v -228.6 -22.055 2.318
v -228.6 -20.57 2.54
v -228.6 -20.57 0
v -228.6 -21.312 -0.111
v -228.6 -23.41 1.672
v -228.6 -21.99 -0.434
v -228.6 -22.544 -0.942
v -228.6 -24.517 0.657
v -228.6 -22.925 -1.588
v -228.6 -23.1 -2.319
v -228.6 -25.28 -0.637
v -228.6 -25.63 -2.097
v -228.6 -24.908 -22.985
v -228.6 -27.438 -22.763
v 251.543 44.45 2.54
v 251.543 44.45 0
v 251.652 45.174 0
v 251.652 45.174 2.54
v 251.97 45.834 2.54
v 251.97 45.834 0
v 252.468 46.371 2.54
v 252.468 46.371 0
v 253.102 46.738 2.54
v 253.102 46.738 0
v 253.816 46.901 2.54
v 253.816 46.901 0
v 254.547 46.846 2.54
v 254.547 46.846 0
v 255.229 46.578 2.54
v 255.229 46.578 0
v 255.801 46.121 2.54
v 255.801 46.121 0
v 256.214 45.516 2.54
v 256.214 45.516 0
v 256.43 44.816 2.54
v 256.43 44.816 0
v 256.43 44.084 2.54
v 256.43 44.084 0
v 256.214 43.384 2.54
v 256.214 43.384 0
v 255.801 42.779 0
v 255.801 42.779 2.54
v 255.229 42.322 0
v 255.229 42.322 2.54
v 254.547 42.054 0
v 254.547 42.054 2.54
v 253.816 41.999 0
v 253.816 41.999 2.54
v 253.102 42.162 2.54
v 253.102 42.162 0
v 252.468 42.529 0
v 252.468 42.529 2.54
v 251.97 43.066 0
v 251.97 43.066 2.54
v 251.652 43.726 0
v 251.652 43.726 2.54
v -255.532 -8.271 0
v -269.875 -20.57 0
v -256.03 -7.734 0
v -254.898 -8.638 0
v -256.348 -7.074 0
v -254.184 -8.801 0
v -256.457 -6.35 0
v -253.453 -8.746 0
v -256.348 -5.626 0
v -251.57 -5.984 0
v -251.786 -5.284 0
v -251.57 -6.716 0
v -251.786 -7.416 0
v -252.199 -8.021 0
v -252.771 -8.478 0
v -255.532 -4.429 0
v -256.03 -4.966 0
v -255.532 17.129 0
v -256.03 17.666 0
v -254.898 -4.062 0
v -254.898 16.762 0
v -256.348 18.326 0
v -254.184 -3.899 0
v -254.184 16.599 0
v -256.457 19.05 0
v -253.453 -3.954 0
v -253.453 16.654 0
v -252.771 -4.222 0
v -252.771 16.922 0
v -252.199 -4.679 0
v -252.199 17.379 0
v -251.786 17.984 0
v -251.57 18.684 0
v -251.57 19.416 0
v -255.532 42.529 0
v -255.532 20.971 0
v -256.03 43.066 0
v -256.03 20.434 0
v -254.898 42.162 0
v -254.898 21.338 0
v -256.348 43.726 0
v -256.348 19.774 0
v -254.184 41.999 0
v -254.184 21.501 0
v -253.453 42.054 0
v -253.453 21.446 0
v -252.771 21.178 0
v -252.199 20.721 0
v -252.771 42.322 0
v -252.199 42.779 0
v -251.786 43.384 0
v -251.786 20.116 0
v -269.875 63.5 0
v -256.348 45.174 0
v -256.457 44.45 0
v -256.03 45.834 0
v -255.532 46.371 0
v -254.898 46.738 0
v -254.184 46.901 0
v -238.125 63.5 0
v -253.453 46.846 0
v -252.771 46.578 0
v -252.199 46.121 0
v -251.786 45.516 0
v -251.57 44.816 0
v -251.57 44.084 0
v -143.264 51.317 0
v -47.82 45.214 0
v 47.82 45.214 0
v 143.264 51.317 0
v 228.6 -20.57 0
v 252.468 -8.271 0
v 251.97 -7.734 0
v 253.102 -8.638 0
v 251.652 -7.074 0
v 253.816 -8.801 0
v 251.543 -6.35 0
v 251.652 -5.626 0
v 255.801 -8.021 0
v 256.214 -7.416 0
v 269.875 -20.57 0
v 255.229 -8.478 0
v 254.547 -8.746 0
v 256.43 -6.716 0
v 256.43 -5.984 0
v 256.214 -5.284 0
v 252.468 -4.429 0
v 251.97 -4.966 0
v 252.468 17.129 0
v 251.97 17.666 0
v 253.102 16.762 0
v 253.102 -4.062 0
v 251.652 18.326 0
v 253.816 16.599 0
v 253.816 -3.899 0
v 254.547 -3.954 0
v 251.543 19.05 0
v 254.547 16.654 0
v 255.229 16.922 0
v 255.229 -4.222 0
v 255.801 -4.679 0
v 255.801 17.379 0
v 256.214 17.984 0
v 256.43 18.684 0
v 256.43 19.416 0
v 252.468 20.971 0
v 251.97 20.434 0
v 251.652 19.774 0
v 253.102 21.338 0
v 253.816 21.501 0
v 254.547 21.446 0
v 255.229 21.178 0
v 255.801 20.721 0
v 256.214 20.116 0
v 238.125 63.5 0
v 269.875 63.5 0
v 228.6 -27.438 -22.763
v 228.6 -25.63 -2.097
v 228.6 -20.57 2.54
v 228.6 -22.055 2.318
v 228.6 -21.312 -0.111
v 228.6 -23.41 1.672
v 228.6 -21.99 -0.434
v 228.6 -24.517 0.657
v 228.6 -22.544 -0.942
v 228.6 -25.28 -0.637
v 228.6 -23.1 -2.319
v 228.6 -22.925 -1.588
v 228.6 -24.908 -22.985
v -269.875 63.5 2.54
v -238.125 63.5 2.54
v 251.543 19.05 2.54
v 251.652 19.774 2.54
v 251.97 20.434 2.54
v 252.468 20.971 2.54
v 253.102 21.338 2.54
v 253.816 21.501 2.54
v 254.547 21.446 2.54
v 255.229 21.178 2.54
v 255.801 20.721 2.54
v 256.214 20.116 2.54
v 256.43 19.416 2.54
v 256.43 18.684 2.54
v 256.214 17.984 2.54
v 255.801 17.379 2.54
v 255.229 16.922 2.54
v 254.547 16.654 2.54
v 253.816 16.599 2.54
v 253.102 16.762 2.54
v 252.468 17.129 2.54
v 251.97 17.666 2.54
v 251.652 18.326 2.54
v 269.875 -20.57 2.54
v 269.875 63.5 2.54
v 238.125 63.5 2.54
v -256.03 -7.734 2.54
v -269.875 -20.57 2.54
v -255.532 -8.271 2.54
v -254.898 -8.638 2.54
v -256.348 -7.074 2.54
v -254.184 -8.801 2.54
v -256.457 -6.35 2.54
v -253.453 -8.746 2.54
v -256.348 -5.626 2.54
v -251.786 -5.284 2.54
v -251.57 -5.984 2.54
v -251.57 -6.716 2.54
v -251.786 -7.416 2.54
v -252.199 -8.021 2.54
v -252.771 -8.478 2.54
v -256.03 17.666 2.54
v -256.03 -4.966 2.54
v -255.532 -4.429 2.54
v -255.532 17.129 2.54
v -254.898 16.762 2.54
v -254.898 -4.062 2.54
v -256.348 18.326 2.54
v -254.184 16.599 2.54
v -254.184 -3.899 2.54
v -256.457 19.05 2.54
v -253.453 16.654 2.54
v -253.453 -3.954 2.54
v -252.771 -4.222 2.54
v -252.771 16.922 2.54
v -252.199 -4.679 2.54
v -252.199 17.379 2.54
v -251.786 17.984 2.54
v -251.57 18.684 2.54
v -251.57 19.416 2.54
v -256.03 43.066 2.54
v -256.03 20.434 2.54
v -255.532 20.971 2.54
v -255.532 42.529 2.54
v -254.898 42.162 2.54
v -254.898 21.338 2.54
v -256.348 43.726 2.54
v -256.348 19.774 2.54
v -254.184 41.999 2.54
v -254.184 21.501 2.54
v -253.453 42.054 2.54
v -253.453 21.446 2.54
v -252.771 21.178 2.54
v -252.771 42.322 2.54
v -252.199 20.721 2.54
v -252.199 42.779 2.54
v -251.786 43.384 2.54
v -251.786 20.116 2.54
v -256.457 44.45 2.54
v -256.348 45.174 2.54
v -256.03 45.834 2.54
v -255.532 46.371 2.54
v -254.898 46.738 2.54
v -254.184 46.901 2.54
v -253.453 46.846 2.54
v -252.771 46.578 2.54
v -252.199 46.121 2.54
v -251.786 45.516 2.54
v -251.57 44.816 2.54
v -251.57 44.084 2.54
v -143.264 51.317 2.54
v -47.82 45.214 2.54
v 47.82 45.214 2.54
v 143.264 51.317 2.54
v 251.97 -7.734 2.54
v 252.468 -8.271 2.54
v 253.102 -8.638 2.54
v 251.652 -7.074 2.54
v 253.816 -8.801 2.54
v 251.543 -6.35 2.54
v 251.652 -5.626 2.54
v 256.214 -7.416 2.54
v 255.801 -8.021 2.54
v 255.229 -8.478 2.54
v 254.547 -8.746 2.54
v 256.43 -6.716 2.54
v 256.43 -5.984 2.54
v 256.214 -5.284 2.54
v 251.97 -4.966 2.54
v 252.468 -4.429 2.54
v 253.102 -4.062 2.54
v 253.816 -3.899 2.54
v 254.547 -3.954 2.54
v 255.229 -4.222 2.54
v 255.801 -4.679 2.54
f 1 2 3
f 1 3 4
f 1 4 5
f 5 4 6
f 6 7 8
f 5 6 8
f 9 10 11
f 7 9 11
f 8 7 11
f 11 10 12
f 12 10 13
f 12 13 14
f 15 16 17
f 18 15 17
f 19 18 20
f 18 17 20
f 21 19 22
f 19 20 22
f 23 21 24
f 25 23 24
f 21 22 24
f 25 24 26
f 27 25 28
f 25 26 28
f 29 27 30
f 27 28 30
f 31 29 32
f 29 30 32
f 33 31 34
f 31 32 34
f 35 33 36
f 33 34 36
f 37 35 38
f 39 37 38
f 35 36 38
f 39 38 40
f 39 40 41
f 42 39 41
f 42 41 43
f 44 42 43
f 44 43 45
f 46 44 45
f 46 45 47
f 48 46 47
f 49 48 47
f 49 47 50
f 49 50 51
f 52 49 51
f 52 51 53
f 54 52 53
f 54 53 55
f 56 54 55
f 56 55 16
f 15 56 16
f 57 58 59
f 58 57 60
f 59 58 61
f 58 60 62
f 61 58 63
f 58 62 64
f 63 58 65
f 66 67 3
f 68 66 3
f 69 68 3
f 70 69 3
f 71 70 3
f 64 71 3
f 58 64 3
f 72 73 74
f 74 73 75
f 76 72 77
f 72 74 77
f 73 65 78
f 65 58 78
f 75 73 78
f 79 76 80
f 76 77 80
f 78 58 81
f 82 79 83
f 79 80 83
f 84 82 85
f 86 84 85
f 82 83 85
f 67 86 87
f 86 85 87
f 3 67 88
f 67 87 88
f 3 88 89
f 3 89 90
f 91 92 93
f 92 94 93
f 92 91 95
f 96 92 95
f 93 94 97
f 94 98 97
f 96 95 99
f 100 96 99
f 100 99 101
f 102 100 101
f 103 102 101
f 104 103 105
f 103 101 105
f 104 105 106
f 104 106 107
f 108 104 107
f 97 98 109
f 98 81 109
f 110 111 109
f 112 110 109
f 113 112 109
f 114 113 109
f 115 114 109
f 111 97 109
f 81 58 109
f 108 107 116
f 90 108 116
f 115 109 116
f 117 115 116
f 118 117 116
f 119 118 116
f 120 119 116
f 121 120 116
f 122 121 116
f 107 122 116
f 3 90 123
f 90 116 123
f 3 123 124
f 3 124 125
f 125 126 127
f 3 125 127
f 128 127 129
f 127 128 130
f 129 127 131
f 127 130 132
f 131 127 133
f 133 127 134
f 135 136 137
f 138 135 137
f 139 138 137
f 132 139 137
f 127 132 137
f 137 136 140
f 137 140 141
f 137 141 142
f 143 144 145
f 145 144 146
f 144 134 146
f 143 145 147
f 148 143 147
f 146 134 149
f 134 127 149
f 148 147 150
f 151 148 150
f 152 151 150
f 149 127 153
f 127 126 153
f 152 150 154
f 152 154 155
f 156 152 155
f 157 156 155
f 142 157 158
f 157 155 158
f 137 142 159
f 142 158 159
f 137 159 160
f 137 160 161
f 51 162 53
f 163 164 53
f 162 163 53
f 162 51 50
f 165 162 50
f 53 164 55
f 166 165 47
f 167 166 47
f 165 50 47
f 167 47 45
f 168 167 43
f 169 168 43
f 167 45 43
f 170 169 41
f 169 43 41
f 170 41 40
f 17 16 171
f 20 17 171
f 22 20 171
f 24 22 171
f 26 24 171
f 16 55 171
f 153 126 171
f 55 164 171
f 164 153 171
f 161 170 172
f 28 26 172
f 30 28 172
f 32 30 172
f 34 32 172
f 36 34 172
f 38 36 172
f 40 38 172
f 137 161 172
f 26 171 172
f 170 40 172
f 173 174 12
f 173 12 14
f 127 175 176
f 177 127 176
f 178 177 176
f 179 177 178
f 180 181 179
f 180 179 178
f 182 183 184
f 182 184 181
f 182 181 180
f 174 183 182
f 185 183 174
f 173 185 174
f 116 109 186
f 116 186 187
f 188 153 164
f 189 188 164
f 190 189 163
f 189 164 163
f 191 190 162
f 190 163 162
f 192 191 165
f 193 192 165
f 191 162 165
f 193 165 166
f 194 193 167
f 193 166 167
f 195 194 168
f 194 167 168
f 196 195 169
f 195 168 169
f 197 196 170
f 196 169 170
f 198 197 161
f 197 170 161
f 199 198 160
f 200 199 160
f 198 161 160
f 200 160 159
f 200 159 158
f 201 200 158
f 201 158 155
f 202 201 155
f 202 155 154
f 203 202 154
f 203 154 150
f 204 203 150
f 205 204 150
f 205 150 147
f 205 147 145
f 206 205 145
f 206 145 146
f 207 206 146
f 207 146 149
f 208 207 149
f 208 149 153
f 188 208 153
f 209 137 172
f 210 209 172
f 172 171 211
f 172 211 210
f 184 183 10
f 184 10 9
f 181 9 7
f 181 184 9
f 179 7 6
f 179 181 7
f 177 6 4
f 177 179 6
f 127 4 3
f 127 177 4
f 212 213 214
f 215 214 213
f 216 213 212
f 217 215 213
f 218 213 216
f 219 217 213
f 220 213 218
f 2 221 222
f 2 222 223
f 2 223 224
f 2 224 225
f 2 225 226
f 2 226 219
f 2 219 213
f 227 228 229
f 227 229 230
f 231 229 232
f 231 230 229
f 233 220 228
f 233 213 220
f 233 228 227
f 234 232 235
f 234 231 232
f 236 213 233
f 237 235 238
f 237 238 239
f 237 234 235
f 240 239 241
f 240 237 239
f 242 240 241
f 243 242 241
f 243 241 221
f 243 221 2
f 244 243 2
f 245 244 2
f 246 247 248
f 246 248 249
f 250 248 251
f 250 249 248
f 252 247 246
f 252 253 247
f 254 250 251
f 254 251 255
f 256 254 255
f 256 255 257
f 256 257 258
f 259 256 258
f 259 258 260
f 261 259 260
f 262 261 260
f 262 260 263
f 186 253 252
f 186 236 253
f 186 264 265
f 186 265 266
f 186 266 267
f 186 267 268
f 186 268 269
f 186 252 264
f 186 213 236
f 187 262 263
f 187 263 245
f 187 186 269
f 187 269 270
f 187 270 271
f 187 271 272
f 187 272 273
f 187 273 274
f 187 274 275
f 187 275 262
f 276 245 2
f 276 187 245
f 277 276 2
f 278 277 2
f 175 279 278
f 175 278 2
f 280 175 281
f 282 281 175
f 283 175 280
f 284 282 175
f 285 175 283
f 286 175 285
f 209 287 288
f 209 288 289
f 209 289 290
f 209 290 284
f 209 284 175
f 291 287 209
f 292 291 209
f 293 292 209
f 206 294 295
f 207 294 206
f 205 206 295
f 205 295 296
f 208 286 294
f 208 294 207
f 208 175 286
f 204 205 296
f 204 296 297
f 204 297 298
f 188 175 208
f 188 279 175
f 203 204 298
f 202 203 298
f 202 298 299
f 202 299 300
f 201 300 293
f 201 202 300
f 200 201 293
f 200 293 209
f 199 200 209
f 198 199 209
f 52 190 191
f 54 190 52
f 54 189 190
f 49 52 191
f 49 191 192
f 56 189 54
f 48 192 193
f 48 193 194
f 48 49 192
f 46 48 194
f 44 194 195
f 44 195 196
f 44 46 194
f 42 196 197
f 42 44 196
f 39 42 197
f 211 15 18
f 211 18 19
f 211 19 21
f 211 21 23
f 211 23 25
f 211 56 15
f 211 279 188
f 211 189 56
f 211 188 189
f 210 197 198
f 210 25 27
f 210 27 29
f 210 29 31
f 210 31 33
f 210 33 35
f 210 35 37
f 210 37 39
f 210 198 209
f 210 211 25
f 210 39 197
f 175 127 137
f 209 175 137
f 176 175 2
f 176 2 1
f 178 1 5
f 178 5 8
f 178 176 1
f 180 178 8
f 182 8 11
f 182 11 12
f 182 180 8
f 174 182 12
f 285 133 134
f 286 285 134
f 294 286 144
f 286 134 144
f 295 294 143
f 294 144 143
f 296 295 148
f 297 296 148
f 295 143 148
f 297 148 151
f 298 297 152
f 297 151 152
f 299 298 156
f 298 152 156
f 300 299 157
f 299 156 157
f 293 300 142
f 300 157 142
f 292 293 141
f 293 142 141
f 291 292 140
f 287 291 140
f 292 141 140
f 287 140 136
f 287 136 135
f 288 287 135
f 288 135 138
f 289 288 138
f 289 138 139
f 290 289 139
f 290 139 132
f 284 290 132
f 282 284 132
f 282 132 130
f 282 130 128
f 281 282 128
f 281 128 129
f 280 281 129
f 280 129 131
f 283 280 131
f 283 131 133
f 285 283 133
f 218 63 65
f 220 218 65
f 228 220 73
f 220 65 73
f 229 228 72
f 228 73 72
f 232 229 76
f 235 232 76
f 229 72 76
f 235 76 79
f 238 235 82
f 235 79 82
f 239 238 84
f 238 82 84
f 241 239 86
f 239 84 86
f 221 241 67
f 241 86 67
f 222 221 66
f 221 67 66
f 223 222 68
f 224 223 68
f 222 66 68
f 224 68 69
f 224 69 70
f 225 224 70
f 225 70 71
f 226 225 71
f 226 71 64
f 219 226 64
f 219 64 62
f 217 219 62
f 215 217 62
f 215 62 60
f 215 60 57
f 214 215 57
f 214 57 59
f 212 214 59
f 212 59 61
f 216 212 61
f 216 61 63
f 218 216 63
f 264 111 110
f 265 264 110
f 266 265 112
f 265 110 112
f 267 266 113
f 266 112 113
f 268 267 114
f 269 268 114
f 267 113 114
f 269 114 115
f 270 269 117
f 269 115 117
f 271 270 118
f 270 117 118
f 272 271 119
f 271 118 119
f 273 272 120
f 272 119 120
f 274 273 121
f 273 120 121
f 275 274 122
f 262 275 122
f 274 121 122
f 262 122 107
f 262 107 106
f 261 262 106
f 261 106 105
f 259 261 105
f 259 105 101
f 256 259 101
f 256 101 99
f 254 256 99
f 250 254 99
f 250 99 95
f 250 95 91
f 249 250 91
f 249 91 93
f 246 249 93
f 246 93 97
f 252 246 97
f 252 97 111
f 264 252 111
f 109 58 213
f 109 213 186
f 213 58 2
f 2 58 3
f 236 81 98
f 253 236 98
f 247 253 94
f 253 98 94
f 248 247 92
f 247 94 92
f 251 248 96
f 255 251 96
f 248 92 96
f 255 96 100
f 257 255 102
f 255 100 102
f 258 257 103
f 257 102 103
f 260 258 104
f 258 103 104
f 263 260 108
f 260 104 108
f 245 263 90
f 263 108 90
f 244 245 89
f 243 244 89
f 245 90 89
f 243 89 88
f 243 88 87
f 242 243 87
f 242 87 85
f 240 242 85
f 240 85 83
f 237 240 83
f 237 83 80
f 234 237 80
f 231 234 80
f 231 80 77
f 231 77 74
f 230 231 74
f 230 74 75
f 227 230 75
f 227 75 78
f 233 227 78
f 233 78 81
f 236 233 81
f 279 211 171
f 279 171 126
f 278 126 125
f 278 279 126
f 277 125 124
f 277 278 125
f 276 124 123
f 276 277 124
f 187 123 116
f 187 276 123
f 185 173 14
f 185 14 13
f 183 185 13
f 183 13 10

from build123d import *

# Parameters (mm, degrees)
SKETCH2_W             = 539.75
SKETCH2_H             = 84.069565479
BOSS_EXTRUDE1_DEPTH   = 2.54
EDGE_FLANGE1_DEPTH    = 457.2
CUT_EXTRUDE2_DEPTH    = 279.417450967
F_8_CLEARANCE_HOLE1_D = 4.9149


# Sheet-metal steps are written as plain solids
with BuildPart() as part:
    # Sketch2 → Boss-Extrude1 (new body)
    with BuildSketch(Plane.XY):
        with Locations((0, 21.465217261)):
            Rectangle(SKETCH2_W, SKETCH2_H)
    extrude(amount=BOSS_EXTRUDE1_DEPTH)

    # Edge-Flange1 section (across the edge) → Edge-Flange1 (add)
    with BuildSketch(Plane(origin=(228.6, -22.897046661, 0), x_dir=(0, 0.9961946980917445, -0.08715574274766974), z_dir=(-1, 0, 0))):
        with BuildLine():
            Line((-2.54, 2.327481182), (-2.54, 23.072518818))
            Line((-2.54, 23.072518818), (0, 23.072518818))
            Line((0, 23.072518818), (0, 2.327481182))
            ThreePointArc((0, 2.327481182), (0.667315565, 0.611482055), (2.318624413, -0.202853351))
            Line((2.318624413, -0.202853351), (2.097248827, -2.733187884))
            ThreePointArc((2.097248827, -2.733187884), (-1.205368871, -1.104517073), (-2.54, 2.327481182))
        make_face()
    extrude(amount=EDGE_FLANGE1_DEPTH)

    # Sketch17 → Cut-Extrude2 (cut, through all)
    with BuildSketch(Plane.XY.offset(2.54)):
        with BuildLine():
            Line((-238.125, 63.5), (238.125, 63.5))
            ThreePointArc((238.125, 63.5), (0, 44.45), (-238.125, 63.5))
        make_face()
    extrude(amount=-CUT_EXTRUDE2_DEPTH, mode=Mode.SUBTRACT)

    # #8 Clearance Hole1 (through all)
    with Locations(Plane.XY.offset(2.54)):
        with Locations((-254, 44.45), (-254, 19.05), (-254, -6.35), (254, -6.35), (254, 19.05), (254, 44.45)):
            Hole(F_8_CLEARANCE_HOLE1_D / 2)


solid = part.part
